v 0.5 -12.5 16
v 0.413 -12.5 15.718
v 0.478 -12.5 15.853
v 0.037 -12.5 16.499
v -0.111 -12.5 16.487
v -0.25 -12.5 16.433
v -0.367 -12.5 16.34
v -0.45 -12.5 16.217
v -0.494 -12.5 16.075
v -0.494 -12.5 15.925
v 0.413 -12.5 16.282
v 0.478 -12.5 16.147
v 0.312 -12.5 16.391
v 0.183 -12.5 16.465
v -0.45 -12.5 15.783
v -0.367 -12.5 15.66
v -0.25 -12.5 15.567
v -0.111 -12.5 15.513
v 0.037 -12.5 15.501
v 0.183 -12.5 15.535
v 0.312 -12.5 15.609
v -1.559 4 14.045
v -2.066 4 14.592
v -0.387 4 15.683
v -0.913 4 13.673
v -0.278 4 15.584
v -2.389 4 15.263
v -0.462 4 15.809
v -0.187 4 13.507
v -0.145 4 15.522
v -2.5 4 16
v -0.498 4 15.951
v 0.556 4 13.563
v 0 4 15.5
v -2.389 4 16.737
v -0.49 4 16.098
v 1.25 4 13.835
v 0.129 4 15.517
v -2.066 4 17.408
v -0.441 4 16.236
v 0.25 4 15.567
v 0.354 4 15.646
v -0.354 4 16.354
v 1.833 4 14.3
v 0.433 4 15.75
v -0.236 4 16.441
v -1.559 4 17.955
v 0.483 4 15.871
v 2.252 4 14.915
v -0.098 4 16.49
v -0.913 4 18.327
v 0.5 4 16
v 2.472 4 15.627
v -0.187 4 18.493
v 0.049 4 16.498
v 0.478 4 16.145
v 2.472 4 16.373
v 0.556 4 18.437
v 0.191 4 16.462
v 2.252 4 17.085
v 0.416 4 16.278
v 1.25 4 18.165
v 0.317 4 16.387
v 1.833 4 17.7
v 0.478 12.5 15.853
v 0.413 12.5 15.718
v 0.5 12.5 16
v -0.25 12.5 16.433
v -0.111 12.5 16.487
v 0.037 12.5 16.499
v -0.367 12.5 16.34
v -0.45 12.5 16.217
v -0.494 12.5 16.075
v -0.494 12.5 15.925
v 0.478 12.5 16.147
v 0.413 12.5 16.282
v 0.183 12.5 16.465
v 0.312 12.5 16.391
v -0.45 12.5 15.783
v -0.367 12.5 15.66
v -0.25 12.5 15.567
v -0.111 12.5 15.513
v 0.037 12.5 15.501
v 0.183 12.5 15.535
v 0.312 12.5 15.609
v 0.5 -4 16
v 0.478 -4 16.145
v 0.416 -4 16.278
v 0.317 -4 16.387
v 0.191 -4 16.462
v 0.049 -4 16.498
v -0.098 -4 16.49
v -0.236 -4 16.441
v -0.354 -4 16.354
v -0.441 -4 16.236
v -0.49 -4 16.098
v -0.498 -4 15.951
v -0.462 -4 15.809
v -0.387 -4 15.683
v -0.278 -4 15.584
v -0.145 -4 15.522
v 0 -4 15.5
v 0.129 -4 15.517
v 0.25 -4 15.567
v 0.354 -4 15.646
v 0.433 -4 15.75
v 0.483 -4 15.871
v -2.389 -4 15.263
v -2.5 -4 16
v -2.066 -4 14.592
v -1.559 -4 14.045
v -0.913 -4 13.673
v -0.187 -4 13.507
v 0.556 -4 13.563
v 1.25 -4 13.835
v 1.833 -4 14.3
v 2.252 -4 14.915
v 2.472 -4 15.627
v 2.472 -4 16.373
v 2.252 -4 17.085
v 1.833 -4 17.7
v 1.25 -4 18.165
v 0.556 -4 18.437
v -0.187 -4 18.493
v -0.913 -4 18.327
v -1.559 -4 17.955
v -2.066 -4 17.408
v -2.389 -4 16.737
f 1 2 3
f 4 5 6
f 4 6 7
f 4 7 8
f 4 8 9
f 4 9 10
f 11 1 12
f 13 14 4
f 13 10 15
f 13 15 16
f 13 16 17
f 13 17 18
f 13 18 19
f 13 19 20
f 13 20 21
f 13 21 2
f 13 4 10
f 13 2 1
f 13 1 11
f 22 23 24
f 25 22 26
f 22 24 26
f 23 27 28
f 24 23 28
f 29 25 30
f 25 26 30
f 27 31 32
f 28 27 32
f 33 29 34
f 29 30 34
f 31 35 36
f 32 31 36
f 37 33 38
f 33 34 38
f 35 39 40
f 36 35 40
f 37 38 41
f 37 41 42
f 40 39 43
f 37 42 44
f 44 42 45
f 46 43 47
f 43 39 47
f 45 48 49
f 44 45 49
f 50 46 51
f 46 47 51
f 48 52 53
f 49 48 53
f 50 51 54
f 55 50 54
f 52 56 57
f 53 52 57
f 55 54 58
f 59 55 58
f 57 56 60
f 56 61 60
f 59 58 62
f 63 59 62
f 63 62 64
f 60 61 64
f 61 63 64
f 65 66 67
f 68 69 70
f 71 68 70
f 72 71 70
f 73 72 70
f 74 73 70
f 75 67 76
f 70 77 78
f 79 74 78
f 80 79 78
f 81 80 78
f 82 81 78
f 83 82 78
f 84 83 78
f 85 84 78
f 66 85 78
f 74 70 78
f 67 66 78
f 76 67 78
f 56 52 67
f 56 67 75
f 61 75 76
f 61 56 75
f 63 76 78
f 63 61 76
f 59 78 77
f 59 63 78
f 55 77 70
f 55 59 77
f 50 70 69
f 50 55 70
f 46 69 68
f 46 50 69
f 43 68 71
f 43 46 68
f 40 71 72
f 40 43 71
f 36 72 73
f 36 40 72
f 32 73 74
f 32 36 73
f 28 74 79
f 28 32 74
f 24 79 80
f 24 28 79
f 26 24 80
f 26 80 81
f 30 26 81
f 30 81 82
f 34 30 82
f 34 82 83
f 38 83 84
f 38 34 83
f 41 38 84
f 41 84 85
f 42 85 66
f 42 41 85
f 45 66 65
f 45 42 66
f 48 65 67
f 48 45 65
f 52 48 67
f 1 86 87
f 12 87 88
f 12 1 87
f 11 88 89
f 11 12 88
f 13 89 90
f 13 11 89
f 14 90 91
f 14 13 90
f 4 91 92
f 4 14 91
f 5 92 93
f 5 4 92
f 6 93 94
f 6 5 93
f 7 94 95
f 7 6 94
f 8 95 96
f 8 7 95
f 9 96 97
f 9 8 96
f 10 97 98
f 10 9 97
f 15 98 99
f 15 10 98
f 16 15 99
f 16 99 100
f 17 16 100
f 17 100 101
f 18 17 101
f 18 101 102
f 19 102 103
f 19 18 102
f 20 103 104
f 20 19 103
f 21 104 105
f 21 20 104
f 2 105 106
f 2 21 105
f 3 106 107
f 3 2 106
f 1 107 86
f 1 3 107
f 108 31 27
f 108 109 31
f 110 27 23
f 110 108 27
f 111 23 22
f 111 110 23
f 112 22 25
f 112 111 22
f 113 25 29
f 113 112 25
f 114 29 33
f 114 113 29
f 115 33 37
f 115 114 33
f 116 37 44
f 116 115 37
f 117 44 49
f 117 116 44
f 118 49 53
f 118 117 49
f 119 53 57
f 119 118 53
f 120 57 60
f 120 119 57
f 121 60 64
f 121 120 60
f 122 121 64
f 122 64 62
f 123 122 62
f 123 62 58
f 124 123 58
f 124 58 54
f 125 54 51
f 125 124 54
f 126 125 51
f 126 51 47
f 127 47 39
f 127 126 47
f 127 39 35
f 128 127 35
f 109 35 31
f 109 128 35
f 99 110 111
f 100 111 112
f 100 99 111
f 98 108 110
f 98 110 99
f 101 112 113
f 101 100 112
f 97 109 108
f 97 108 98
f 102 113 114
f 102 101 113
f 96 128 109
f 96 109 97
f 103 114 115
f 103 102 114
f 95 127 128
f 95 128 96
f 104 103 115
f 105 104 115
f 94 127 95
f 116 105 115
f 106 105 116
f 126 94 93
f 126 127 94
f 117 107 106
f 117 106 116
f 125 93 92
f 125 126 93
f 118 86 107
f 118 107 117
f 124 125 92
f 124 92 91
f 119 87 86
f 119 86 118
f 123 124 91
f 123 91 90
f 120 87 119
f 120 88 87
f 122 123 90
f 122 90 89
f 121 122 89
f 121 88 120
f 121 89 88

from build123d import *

# Parameters (mm, degrees)
F1_DEPTH = 4
F4_DEPTH = 25
F5_R     = 0.5
F6_DEPTH = 12.5


with BuildPart() as f1:
    # F0 (on Front) → F1 (new body, symmetric)
    with BuildSketch(Plane.XZ):
        with BuildLine():
            Line((-2.5, 16), (2.5, 16))
            ThreePointArc((2.5, 16), (0, 18.5), (-2.5, 16))
        make_face()
        with BuildLine():
            ThreePointArc((-2.5, 16), (0, 13.5), (2.5, 16))
            Line((2.5, 16), (-2.5, 16))
        make_face()
    extrude(amount=F1_DEPTH, both=True)

    # F3 (on offset) → F4 (cut)
    with BuildSketch(Plane.XZ.offset(4)):
        with BuildLine():
            ThreePointArc((0, 15.5), (0.3535533906, 15.6464466094), (0.5, 16))
            ThreePointArc((0.5, 16), (-0.3535533906, 16.3535533906), (0, 15.5))
        make_face()
    extrude(amount=-F4_DEPTH, mode=Mode.SUBTRACT)

    # F5 (on Front) → F6 (join, symmetric)
    with BuildSketch(Plane.XZ):
        with Locations((0, 16)):
            Circle(F5_R)
    extrude(amount=F6_DEPTH, both=True)


solid = f1.part
